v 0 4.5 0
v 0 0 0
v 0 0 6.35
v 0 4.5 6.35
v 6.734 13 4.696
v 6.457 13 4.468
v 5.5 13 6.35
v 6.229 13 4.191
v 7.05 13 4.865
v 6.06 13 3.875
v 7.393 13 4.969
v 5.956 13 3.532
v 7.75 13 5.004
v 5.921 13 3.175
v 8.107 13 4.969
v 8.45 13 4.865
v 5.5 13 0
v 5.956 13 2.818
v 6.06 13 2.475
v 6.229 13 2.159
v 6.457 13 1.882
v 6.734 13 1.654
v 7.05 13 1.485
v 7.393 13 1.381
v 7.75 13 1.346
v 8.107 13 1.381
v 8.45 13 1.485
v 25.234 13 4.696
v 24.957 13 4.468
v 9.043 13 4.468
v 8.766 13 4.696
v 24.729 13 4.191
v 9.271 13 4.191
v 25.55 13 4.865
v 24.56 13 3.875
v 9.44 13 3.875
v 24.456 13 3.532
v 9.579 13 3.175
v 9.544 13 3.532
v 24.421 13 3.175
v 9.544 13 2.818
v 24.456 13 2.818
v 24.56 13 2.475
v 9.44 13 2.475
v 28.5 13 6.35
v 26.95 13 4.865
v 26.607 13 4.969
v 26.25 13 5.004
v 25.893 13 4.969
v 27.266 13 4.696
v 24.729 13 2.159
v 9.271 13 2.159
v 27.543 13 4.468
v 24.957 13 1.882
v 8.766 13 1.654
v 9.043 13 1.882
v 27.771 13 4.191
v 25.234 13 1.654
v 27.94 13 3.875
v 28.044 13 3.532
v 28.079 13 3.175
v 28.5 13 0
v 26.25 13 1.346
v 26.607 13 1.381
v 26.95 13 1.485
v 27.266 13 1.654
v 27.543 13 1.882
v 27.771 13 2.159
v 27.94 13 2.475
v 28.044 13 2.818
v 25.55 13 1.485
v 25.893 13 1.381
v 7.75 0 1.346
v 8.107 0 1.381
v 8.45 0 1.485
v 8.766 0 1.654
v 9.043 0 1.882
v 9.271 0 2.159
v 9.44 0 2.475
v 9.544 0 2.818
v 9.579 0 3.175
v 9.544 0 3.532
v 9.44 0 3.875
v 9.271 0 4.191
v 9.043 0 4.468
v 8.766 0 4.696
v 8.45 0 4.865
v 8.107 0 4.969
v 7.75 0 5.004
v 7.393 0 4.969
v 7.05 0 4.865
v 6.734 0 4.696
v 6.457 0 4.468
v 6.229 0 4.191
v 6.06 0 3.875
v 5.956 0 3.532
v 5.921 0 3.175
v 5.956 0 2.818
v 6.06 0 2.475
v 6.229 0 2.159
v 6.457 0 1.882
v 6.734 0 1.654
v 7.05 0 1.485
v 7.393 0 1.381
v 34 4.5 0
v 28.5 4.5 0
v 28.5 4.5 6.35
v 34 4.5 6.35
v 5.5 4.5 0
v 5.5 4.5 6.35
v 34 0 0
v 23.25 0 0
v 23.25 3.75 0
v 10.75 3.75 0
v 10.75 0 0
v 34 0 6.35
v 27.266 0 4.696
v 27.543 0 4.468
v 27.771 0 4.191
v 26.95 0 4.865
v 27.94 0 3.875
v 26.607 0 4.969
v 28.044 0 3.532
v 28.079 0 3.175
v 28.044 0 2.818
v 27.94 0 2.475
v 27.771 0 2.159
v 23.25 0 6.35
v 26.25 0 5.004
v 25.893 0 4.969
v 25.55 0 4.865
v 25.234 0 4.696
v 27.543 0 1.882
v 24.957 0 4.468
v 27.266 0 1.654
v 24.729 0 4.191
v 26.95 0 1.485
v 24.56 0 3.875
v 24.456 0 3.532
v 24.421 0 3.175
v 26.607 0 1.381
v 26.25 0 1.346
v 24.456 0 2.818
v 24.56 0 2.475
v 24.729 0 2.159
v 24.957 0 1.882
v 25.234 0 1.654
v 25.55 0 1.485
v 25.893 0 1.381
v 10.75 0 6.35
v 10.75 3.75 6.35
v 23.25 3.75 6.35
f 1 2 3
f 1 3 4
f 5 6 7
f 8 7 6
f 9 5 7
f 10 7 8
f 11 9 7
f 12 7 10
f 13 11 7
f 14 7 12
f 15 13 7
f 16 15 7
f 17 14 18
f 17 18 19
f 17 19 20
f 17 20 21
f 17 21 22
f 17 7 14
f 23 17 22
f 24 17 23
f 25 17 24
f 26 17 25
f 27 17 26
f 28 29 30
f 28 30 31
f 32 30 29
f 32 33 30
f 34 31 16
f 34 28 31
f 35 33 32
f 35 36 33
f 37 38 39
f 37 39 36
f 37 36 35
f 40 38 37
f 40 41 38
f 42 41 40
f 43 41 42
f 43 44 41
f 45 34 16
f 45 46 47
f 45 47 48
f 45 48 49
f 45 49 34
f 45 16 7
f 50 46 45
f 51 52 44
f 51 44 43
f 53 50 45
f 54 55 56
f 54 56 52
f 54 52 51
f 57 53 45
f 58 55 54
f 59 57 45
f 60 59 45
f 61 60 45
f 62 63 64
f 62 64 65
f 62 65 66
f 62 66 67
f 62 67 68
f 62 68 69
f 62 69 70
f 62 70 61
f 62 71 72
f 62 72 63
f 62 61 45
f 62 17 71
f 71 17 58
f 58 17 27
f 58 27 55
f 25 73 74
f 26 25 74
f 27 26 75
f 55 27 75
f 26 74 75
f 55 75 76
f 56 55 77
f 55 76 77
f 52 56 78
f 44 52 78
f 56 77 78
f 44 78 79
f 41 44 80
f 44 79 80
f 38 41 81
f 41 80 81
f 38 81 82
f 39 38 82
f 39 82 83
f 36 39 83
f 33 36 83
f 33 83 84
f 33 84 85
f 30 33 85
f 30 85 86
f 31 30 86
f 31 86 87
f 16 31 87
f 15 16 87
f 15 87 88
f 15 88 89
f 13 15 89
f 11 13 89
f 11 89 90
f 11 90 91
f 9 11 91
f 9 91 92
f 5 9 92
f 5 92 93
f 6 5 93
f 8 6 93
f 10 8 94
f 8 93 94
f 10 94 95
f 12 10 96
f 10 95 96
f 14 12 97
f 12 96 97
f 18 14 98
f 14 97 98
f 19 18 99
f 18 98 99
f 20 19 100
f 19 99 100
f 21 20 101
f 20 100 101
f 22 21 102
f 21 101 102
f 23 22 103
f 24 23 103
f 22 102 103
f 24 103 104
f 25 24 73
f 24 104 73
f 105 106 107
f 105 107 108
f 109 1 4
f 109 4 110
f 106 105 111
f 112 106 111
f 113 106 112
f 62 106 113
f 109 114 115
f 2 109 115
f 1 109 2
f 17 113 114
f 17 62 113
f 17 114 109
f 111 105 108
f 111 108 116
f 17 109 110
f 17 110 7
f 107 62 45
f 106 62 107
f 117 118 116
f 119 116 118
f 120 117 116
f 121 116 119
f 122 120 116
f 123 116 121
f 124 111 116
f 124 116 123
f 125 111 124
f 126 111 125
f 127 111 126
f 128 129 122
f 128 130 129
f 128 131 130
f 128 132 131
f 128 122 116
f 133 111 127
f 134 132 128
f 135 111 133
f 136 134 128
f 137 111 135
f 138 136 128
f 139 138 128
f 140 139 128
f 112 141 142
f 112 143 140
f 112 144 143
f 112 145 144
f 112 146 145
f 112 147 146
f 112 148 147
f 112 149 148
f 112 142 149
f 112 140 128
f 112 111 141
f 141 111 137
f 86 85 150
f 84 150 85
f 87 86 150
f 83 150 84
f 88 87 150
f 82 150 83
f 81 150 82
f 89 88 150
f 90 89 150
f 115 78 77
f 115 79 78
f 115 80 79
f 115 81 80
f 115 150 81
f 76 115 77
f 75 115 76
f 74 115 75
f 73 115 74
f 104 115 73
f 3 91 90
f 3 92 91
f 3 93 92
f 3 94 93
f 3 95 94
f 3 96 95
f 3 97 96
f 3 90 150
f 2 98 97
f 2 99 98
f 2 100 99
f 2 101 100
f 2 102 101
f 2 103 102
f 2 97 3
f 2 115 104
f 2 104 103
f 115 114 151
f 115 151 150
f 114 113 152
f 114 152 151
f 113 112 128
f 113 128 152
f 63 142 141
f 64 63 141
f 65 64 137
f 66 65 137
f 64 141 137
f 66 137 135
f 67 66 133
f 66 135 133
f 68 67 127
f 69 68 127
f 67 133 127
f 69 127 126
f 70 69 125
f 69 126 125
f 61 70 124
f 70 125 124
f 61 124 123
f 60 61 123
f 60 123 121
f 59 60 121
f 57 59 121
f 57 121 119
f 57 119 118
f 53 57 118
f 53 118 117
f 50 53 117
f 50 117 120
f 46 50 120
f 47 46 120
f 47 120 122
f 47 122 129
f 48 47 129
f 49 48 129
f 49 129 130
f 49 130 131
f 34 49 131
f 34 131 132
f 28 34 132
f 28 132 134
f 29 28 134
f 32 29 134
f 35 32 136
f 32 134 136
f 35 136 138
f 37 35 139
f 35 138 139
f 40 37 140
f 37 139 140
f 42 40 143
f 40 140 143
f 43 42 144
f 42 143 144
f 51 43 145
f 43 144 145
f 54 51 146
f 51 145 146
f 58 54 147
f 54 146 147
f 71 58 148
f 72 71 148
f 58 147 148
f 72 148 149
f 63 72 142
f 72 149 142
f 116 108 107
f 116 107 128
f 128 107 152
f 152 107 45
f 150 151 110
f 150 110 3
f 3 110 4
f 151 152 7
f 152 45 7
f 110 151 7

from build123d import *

# Parameters (mm, degrees)
BOSS_EXTRUDE1_DEPTH   = 6.35
F_6_CLEARANCE_HOLE1_D = 3.6576


with BuildPart() as part:
    # Sketch1 → Boss-Extrude1 (new body)
    with BuildSketch(Plane.XY):
        Polygon((0, 0), (0, 4.5), (5.5, 4.5), (5.5, 13), (28.5, 13), (28.5, 4.5), (34, 4.5), (34, 0), (23.25, 0), (23.25, 3.75), (10.75, 3.75), (10.75, 0), align=None)
    extrude(amount=BOSS_EXTRUDE1_DEPTH)

    # #6 Clearance Hole1 (through all)
    with Locations(Plane(origin=(26.25, 13, 3.175), x_dir=(0, 0, 1), z_dir=(0, 1, 0))):
        with Locations((0, 0), (0, -18.5)):
            Hole(F_6_CLEARANCE_HOLE1_D / 2)


solid = part.part
